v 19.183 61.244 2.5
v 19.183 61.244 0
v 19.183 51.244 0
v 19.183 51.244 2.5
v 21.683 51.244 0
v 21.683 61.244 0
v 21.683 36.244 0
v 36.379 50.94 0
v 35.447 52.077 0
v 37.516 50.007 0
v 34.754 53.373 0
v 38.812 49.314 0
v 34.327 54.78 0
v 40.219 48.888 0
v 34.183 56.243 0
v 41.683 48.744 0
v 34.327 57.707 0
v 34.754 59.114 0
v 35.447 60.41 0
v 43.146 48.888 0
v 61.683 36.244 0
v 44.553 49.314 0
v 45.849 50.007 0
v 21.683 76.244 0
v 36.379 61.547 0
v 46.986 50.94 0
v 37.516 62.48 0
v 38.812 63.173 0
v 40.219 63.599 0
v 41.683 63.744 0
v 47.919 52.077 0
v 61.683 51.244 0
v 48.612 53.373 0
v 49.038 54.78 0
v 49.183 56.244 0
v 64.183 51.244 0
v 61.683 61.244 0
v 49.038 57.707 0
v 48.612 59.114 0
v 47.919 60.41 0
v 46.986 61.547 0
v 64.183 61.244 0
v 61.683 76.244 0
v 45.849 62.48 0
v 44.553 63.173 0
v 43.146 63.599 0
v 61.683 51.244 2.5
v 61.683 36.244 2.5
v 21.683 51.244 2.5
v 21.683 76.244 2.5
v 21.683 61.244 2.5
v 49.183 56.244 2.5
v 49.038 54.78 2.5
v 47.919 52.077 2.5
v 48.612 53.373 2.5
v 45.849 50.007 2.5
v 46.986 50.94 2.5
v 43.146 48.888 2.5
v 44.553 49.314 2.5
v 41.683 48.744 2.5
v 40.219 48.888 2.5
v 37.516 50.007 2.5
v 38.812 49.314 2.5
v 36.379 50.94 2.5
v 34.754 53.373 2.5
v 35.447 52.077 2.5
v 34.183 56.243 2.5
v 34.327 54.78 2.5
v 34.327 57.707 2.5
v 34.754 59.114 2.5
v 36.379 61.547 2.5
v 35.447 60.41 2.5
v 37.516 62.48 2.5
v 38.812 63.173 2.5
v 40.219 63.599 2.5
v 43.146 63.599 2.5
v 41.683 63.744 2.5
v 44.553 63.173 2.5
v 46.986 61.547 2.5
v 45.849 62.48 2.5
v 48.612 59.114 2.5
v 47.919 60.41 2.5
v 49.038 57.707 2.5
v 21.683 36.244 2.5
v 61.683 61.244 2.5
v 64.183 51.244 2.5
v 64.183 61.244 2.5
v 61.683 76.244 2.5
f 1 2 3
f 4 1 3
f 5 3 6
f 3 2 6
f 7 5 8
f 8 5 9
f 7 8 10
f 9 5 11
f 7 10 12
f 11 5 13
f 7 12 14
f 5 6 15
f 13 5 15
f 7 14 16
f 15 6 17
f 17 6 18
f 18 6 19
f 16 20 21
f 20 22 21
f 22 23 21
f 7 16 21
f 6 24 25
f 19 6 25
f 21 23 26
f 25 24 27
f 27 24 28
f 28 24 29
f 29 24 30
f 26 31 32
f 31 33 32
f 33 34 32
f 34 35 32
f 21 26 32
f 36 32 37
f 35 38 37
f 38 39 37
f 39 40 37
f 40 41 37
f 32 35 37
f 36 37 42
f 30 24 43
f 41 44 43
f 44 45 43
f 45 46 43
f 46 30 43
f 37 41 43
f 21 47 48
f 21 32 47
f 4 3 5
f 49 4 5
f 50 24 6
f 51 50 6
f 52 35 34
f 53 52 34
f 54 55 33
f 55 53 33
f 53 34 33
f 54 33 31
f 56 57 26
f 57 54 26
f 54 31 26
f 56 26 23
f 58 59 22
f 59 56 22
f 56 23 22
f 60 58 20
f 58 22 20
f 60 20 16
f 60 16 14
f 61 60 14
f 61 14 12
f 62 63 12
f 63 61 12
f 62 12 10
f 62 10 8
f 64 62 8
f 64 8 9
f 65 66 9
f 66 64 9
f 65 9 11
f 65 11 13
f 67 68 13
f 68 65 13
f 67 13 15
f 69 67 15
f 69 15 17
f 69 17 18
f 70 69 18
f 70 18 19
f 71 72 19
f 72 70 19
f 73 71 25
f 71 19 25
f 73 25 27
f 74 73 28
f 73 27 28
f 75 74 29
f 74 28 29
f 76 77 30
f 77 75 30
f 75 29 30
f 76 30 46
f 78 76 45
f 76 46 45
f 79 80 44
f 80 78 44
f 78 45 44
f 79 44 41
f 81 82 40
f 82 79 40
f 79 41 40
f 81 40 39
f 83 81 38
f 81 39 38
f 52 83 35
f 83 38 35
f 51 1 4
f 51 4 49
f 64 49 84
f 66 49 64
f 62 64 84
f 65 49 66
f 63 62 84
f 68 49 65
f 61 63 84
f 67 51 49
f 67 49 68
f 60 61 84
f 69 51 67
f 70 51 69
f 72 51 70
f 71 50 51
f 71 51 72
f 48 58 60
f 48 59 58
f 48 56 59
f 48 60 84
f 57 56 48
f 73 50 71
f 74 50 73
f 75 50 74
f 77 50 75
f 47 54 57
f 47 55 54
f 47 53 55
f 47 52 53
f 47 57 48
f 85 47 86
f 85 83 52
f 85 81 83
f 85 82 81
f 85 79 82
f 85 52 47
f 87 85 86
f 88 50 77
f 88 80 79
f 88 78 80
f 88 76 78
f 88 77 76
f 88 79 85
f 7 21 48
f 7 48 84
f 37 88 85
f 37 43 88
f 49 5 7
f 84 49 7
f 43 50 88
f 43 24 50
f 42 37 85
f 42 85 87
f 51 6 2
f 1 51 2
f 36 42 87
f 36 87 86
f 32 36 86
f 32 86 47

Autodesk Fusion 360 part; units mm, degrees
sketch "Sketch1" plane through (0, 0, 0) normal (0, 0, 1) x (1, 0, 0)
  line L0 (21.6826, 76.2435) -> (61.6826, 76.2435)
  line L1 (61.6826, 76.2435) -> (61.6826, 61.2435)
  line L2 (21.6826, 76.2435) -> (21.6826, 61.2435)
  line L3 (61.6826, 61.2435) -> (64.1826, 61.2435)
  line L4 (21.6826, 61.2435) -> (19.1826, 61.2435)
  line L5 (64.1826, 61.2435) -> (64.1826, 51.2435)
  line L6 (19.1826, 61.2435) -> (19.1826, 51.2435)
  line L7 (64.1826, 51.2435) -> (61.6826, 51.2435)
  line L8 (19.1826, 51.2435) -> (21.6826, 51.2435)
  line L9 (21.6826, 51.2435) -> (21.6826, 36.2435)
  line L10 (61.6826, 51.2435) -> (61.6826, 36.2435)
  line L11 (61.6826, 36.2435) -> (21.6826, 36.2435)
  circle A0 centre (41.6826, 56.2435) radius 7.5
  dimension "d1" = 40
  dimension "d2" = 15
  dimension "d3" = 15
  dimension "d4" = 2.5
  dimension "d5" = 2.5
  dimension "d6" = 10
  dimension "d7" = 10
  dimension "d8" = 2.5
  dimension "d9" = 2.5
  dimension "d10" = 15
  dimension "d11" = 15
  dimension "d12" = 15
  dimension "d13" = 20
  dimension "d14" = 22.5
extrude "Extrude1" add sketch "Sketch1" along normal blind 2.5
